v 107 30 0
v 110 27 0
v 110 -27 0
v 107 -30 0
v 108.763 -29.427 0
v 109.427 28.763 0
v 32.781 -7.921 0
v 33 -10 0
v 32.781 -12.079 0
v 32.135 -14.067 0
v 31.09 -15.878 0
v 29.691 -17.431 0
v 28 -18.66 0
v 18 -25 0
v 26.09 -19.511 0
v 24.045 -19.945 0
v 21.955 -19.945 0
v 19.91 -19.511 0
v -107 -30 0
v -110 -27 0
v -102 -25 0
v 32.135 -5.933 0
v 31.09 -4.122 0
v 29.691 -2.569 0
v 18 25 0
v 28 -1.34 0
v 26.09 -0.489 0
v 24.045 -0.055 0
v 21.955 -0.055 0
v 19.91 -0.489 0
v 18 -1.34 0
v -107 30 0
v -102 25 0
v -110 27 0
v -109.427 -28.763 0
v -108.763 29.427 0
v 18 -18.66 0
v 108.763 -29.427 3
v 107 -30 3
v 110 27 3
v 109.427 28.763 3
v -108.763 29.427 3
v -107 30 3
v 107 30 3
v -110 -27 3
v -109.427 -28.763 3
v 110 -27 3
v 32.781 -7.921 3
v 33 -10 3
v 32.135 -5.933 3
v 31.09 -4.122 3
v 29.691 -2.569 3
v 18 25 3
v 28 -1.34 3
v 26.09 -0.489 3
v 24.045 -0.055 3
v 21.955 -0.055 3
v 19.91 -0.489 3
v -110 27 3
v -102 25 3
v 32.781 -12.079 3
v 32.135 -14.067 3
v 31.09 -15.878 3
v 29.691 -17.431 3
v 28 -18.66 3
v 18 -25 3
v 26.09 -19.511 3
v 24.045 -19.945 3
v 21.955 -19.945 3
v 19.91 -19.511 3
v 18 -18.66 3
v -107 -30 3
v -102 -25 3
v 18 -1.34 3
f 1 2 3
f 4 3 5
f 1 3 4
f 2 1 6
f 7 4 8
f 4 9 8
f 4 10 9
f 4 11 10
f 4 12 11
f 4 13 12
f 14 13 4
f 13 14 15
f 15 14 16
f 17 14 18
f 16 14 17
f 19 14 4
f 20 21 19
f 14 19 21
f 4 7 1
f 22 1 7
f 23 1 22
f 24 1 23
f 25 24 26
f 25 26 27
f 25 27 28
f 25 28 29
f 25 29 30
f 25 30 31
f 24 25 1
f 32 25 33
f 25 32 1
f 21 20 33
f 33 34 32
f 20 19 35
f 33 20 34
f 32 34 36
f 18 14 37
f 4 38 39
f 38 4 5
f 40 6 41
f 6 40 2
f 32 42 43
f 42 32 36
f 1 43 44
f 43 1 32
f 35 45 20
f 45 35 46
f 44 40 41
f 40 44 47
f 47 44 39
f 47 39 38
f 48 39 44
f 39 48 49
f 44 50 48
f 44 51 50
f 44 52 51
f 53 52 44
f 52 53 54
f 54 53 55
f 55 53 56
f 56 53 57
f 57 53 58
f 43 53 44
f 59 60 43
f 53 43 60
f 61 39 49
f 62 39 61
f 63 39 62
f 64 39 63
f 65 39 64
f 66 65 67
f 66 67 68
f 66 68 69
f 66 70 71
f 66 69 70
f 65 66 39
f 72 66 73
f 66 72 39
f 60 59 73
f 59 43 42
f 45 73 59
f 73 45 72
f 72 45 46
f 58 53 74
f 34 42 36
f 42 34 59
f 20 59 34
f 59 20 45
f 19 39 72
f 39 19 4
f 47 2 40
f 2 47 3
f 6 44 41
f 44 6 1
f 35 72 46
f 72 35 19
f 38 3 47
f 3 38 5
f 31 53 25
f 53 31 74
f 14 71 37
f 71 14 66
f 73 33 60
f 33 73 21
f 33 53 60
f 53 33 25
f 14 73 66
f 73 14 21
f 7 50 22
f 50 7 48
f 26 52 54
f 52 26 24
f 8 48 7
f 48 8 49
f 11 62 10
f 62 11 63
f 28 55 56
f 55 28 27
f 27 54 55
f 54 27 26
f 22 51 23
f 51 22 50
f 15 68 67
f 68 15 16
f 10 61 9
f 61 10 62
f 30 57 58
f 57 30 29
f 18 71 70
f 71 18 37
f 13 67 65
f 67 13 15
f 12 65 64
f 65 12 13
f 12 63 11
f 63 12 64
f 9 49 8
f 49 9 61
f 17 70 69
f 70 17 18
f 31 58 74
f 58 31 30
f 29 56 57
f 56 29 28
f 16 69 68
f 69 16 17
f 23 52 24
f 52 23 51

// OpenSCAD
// --- Panel Parameters
plate_w = 220; //mm
plate_h = 60;
plate_t = 3;
corner_r = 3;

// --- Cutout parameters
edge = 8;
lcd_w = 120;
lcd_h = 50;
lcd_y = 0;
lcd_x = -plate_w/2 + edge + lcd_w/2;

// round rectangle
module rounded_plate(w, h, r, t) {
    linear_extrude(height=t)
        offset(r=r) offset(delta=-r) square([w,h], center= true);
}

// screw holes
module screw_holes(){
    
}

difference(){
    // base
    translate([0,0,0]) rounded_plate(plate_w, plate_h, corner_r, plate_t);
    
    // LCD
    translate([lcd_x, lcd_y, 0]) cube([lcd_w, lcd_h, plate_t+5], center=true);
    
    // rotary encoder cut
    translate([lcd_x + 65, lcd_y-10, -1])linear_extrude(height=5) circle(r=10);
}
